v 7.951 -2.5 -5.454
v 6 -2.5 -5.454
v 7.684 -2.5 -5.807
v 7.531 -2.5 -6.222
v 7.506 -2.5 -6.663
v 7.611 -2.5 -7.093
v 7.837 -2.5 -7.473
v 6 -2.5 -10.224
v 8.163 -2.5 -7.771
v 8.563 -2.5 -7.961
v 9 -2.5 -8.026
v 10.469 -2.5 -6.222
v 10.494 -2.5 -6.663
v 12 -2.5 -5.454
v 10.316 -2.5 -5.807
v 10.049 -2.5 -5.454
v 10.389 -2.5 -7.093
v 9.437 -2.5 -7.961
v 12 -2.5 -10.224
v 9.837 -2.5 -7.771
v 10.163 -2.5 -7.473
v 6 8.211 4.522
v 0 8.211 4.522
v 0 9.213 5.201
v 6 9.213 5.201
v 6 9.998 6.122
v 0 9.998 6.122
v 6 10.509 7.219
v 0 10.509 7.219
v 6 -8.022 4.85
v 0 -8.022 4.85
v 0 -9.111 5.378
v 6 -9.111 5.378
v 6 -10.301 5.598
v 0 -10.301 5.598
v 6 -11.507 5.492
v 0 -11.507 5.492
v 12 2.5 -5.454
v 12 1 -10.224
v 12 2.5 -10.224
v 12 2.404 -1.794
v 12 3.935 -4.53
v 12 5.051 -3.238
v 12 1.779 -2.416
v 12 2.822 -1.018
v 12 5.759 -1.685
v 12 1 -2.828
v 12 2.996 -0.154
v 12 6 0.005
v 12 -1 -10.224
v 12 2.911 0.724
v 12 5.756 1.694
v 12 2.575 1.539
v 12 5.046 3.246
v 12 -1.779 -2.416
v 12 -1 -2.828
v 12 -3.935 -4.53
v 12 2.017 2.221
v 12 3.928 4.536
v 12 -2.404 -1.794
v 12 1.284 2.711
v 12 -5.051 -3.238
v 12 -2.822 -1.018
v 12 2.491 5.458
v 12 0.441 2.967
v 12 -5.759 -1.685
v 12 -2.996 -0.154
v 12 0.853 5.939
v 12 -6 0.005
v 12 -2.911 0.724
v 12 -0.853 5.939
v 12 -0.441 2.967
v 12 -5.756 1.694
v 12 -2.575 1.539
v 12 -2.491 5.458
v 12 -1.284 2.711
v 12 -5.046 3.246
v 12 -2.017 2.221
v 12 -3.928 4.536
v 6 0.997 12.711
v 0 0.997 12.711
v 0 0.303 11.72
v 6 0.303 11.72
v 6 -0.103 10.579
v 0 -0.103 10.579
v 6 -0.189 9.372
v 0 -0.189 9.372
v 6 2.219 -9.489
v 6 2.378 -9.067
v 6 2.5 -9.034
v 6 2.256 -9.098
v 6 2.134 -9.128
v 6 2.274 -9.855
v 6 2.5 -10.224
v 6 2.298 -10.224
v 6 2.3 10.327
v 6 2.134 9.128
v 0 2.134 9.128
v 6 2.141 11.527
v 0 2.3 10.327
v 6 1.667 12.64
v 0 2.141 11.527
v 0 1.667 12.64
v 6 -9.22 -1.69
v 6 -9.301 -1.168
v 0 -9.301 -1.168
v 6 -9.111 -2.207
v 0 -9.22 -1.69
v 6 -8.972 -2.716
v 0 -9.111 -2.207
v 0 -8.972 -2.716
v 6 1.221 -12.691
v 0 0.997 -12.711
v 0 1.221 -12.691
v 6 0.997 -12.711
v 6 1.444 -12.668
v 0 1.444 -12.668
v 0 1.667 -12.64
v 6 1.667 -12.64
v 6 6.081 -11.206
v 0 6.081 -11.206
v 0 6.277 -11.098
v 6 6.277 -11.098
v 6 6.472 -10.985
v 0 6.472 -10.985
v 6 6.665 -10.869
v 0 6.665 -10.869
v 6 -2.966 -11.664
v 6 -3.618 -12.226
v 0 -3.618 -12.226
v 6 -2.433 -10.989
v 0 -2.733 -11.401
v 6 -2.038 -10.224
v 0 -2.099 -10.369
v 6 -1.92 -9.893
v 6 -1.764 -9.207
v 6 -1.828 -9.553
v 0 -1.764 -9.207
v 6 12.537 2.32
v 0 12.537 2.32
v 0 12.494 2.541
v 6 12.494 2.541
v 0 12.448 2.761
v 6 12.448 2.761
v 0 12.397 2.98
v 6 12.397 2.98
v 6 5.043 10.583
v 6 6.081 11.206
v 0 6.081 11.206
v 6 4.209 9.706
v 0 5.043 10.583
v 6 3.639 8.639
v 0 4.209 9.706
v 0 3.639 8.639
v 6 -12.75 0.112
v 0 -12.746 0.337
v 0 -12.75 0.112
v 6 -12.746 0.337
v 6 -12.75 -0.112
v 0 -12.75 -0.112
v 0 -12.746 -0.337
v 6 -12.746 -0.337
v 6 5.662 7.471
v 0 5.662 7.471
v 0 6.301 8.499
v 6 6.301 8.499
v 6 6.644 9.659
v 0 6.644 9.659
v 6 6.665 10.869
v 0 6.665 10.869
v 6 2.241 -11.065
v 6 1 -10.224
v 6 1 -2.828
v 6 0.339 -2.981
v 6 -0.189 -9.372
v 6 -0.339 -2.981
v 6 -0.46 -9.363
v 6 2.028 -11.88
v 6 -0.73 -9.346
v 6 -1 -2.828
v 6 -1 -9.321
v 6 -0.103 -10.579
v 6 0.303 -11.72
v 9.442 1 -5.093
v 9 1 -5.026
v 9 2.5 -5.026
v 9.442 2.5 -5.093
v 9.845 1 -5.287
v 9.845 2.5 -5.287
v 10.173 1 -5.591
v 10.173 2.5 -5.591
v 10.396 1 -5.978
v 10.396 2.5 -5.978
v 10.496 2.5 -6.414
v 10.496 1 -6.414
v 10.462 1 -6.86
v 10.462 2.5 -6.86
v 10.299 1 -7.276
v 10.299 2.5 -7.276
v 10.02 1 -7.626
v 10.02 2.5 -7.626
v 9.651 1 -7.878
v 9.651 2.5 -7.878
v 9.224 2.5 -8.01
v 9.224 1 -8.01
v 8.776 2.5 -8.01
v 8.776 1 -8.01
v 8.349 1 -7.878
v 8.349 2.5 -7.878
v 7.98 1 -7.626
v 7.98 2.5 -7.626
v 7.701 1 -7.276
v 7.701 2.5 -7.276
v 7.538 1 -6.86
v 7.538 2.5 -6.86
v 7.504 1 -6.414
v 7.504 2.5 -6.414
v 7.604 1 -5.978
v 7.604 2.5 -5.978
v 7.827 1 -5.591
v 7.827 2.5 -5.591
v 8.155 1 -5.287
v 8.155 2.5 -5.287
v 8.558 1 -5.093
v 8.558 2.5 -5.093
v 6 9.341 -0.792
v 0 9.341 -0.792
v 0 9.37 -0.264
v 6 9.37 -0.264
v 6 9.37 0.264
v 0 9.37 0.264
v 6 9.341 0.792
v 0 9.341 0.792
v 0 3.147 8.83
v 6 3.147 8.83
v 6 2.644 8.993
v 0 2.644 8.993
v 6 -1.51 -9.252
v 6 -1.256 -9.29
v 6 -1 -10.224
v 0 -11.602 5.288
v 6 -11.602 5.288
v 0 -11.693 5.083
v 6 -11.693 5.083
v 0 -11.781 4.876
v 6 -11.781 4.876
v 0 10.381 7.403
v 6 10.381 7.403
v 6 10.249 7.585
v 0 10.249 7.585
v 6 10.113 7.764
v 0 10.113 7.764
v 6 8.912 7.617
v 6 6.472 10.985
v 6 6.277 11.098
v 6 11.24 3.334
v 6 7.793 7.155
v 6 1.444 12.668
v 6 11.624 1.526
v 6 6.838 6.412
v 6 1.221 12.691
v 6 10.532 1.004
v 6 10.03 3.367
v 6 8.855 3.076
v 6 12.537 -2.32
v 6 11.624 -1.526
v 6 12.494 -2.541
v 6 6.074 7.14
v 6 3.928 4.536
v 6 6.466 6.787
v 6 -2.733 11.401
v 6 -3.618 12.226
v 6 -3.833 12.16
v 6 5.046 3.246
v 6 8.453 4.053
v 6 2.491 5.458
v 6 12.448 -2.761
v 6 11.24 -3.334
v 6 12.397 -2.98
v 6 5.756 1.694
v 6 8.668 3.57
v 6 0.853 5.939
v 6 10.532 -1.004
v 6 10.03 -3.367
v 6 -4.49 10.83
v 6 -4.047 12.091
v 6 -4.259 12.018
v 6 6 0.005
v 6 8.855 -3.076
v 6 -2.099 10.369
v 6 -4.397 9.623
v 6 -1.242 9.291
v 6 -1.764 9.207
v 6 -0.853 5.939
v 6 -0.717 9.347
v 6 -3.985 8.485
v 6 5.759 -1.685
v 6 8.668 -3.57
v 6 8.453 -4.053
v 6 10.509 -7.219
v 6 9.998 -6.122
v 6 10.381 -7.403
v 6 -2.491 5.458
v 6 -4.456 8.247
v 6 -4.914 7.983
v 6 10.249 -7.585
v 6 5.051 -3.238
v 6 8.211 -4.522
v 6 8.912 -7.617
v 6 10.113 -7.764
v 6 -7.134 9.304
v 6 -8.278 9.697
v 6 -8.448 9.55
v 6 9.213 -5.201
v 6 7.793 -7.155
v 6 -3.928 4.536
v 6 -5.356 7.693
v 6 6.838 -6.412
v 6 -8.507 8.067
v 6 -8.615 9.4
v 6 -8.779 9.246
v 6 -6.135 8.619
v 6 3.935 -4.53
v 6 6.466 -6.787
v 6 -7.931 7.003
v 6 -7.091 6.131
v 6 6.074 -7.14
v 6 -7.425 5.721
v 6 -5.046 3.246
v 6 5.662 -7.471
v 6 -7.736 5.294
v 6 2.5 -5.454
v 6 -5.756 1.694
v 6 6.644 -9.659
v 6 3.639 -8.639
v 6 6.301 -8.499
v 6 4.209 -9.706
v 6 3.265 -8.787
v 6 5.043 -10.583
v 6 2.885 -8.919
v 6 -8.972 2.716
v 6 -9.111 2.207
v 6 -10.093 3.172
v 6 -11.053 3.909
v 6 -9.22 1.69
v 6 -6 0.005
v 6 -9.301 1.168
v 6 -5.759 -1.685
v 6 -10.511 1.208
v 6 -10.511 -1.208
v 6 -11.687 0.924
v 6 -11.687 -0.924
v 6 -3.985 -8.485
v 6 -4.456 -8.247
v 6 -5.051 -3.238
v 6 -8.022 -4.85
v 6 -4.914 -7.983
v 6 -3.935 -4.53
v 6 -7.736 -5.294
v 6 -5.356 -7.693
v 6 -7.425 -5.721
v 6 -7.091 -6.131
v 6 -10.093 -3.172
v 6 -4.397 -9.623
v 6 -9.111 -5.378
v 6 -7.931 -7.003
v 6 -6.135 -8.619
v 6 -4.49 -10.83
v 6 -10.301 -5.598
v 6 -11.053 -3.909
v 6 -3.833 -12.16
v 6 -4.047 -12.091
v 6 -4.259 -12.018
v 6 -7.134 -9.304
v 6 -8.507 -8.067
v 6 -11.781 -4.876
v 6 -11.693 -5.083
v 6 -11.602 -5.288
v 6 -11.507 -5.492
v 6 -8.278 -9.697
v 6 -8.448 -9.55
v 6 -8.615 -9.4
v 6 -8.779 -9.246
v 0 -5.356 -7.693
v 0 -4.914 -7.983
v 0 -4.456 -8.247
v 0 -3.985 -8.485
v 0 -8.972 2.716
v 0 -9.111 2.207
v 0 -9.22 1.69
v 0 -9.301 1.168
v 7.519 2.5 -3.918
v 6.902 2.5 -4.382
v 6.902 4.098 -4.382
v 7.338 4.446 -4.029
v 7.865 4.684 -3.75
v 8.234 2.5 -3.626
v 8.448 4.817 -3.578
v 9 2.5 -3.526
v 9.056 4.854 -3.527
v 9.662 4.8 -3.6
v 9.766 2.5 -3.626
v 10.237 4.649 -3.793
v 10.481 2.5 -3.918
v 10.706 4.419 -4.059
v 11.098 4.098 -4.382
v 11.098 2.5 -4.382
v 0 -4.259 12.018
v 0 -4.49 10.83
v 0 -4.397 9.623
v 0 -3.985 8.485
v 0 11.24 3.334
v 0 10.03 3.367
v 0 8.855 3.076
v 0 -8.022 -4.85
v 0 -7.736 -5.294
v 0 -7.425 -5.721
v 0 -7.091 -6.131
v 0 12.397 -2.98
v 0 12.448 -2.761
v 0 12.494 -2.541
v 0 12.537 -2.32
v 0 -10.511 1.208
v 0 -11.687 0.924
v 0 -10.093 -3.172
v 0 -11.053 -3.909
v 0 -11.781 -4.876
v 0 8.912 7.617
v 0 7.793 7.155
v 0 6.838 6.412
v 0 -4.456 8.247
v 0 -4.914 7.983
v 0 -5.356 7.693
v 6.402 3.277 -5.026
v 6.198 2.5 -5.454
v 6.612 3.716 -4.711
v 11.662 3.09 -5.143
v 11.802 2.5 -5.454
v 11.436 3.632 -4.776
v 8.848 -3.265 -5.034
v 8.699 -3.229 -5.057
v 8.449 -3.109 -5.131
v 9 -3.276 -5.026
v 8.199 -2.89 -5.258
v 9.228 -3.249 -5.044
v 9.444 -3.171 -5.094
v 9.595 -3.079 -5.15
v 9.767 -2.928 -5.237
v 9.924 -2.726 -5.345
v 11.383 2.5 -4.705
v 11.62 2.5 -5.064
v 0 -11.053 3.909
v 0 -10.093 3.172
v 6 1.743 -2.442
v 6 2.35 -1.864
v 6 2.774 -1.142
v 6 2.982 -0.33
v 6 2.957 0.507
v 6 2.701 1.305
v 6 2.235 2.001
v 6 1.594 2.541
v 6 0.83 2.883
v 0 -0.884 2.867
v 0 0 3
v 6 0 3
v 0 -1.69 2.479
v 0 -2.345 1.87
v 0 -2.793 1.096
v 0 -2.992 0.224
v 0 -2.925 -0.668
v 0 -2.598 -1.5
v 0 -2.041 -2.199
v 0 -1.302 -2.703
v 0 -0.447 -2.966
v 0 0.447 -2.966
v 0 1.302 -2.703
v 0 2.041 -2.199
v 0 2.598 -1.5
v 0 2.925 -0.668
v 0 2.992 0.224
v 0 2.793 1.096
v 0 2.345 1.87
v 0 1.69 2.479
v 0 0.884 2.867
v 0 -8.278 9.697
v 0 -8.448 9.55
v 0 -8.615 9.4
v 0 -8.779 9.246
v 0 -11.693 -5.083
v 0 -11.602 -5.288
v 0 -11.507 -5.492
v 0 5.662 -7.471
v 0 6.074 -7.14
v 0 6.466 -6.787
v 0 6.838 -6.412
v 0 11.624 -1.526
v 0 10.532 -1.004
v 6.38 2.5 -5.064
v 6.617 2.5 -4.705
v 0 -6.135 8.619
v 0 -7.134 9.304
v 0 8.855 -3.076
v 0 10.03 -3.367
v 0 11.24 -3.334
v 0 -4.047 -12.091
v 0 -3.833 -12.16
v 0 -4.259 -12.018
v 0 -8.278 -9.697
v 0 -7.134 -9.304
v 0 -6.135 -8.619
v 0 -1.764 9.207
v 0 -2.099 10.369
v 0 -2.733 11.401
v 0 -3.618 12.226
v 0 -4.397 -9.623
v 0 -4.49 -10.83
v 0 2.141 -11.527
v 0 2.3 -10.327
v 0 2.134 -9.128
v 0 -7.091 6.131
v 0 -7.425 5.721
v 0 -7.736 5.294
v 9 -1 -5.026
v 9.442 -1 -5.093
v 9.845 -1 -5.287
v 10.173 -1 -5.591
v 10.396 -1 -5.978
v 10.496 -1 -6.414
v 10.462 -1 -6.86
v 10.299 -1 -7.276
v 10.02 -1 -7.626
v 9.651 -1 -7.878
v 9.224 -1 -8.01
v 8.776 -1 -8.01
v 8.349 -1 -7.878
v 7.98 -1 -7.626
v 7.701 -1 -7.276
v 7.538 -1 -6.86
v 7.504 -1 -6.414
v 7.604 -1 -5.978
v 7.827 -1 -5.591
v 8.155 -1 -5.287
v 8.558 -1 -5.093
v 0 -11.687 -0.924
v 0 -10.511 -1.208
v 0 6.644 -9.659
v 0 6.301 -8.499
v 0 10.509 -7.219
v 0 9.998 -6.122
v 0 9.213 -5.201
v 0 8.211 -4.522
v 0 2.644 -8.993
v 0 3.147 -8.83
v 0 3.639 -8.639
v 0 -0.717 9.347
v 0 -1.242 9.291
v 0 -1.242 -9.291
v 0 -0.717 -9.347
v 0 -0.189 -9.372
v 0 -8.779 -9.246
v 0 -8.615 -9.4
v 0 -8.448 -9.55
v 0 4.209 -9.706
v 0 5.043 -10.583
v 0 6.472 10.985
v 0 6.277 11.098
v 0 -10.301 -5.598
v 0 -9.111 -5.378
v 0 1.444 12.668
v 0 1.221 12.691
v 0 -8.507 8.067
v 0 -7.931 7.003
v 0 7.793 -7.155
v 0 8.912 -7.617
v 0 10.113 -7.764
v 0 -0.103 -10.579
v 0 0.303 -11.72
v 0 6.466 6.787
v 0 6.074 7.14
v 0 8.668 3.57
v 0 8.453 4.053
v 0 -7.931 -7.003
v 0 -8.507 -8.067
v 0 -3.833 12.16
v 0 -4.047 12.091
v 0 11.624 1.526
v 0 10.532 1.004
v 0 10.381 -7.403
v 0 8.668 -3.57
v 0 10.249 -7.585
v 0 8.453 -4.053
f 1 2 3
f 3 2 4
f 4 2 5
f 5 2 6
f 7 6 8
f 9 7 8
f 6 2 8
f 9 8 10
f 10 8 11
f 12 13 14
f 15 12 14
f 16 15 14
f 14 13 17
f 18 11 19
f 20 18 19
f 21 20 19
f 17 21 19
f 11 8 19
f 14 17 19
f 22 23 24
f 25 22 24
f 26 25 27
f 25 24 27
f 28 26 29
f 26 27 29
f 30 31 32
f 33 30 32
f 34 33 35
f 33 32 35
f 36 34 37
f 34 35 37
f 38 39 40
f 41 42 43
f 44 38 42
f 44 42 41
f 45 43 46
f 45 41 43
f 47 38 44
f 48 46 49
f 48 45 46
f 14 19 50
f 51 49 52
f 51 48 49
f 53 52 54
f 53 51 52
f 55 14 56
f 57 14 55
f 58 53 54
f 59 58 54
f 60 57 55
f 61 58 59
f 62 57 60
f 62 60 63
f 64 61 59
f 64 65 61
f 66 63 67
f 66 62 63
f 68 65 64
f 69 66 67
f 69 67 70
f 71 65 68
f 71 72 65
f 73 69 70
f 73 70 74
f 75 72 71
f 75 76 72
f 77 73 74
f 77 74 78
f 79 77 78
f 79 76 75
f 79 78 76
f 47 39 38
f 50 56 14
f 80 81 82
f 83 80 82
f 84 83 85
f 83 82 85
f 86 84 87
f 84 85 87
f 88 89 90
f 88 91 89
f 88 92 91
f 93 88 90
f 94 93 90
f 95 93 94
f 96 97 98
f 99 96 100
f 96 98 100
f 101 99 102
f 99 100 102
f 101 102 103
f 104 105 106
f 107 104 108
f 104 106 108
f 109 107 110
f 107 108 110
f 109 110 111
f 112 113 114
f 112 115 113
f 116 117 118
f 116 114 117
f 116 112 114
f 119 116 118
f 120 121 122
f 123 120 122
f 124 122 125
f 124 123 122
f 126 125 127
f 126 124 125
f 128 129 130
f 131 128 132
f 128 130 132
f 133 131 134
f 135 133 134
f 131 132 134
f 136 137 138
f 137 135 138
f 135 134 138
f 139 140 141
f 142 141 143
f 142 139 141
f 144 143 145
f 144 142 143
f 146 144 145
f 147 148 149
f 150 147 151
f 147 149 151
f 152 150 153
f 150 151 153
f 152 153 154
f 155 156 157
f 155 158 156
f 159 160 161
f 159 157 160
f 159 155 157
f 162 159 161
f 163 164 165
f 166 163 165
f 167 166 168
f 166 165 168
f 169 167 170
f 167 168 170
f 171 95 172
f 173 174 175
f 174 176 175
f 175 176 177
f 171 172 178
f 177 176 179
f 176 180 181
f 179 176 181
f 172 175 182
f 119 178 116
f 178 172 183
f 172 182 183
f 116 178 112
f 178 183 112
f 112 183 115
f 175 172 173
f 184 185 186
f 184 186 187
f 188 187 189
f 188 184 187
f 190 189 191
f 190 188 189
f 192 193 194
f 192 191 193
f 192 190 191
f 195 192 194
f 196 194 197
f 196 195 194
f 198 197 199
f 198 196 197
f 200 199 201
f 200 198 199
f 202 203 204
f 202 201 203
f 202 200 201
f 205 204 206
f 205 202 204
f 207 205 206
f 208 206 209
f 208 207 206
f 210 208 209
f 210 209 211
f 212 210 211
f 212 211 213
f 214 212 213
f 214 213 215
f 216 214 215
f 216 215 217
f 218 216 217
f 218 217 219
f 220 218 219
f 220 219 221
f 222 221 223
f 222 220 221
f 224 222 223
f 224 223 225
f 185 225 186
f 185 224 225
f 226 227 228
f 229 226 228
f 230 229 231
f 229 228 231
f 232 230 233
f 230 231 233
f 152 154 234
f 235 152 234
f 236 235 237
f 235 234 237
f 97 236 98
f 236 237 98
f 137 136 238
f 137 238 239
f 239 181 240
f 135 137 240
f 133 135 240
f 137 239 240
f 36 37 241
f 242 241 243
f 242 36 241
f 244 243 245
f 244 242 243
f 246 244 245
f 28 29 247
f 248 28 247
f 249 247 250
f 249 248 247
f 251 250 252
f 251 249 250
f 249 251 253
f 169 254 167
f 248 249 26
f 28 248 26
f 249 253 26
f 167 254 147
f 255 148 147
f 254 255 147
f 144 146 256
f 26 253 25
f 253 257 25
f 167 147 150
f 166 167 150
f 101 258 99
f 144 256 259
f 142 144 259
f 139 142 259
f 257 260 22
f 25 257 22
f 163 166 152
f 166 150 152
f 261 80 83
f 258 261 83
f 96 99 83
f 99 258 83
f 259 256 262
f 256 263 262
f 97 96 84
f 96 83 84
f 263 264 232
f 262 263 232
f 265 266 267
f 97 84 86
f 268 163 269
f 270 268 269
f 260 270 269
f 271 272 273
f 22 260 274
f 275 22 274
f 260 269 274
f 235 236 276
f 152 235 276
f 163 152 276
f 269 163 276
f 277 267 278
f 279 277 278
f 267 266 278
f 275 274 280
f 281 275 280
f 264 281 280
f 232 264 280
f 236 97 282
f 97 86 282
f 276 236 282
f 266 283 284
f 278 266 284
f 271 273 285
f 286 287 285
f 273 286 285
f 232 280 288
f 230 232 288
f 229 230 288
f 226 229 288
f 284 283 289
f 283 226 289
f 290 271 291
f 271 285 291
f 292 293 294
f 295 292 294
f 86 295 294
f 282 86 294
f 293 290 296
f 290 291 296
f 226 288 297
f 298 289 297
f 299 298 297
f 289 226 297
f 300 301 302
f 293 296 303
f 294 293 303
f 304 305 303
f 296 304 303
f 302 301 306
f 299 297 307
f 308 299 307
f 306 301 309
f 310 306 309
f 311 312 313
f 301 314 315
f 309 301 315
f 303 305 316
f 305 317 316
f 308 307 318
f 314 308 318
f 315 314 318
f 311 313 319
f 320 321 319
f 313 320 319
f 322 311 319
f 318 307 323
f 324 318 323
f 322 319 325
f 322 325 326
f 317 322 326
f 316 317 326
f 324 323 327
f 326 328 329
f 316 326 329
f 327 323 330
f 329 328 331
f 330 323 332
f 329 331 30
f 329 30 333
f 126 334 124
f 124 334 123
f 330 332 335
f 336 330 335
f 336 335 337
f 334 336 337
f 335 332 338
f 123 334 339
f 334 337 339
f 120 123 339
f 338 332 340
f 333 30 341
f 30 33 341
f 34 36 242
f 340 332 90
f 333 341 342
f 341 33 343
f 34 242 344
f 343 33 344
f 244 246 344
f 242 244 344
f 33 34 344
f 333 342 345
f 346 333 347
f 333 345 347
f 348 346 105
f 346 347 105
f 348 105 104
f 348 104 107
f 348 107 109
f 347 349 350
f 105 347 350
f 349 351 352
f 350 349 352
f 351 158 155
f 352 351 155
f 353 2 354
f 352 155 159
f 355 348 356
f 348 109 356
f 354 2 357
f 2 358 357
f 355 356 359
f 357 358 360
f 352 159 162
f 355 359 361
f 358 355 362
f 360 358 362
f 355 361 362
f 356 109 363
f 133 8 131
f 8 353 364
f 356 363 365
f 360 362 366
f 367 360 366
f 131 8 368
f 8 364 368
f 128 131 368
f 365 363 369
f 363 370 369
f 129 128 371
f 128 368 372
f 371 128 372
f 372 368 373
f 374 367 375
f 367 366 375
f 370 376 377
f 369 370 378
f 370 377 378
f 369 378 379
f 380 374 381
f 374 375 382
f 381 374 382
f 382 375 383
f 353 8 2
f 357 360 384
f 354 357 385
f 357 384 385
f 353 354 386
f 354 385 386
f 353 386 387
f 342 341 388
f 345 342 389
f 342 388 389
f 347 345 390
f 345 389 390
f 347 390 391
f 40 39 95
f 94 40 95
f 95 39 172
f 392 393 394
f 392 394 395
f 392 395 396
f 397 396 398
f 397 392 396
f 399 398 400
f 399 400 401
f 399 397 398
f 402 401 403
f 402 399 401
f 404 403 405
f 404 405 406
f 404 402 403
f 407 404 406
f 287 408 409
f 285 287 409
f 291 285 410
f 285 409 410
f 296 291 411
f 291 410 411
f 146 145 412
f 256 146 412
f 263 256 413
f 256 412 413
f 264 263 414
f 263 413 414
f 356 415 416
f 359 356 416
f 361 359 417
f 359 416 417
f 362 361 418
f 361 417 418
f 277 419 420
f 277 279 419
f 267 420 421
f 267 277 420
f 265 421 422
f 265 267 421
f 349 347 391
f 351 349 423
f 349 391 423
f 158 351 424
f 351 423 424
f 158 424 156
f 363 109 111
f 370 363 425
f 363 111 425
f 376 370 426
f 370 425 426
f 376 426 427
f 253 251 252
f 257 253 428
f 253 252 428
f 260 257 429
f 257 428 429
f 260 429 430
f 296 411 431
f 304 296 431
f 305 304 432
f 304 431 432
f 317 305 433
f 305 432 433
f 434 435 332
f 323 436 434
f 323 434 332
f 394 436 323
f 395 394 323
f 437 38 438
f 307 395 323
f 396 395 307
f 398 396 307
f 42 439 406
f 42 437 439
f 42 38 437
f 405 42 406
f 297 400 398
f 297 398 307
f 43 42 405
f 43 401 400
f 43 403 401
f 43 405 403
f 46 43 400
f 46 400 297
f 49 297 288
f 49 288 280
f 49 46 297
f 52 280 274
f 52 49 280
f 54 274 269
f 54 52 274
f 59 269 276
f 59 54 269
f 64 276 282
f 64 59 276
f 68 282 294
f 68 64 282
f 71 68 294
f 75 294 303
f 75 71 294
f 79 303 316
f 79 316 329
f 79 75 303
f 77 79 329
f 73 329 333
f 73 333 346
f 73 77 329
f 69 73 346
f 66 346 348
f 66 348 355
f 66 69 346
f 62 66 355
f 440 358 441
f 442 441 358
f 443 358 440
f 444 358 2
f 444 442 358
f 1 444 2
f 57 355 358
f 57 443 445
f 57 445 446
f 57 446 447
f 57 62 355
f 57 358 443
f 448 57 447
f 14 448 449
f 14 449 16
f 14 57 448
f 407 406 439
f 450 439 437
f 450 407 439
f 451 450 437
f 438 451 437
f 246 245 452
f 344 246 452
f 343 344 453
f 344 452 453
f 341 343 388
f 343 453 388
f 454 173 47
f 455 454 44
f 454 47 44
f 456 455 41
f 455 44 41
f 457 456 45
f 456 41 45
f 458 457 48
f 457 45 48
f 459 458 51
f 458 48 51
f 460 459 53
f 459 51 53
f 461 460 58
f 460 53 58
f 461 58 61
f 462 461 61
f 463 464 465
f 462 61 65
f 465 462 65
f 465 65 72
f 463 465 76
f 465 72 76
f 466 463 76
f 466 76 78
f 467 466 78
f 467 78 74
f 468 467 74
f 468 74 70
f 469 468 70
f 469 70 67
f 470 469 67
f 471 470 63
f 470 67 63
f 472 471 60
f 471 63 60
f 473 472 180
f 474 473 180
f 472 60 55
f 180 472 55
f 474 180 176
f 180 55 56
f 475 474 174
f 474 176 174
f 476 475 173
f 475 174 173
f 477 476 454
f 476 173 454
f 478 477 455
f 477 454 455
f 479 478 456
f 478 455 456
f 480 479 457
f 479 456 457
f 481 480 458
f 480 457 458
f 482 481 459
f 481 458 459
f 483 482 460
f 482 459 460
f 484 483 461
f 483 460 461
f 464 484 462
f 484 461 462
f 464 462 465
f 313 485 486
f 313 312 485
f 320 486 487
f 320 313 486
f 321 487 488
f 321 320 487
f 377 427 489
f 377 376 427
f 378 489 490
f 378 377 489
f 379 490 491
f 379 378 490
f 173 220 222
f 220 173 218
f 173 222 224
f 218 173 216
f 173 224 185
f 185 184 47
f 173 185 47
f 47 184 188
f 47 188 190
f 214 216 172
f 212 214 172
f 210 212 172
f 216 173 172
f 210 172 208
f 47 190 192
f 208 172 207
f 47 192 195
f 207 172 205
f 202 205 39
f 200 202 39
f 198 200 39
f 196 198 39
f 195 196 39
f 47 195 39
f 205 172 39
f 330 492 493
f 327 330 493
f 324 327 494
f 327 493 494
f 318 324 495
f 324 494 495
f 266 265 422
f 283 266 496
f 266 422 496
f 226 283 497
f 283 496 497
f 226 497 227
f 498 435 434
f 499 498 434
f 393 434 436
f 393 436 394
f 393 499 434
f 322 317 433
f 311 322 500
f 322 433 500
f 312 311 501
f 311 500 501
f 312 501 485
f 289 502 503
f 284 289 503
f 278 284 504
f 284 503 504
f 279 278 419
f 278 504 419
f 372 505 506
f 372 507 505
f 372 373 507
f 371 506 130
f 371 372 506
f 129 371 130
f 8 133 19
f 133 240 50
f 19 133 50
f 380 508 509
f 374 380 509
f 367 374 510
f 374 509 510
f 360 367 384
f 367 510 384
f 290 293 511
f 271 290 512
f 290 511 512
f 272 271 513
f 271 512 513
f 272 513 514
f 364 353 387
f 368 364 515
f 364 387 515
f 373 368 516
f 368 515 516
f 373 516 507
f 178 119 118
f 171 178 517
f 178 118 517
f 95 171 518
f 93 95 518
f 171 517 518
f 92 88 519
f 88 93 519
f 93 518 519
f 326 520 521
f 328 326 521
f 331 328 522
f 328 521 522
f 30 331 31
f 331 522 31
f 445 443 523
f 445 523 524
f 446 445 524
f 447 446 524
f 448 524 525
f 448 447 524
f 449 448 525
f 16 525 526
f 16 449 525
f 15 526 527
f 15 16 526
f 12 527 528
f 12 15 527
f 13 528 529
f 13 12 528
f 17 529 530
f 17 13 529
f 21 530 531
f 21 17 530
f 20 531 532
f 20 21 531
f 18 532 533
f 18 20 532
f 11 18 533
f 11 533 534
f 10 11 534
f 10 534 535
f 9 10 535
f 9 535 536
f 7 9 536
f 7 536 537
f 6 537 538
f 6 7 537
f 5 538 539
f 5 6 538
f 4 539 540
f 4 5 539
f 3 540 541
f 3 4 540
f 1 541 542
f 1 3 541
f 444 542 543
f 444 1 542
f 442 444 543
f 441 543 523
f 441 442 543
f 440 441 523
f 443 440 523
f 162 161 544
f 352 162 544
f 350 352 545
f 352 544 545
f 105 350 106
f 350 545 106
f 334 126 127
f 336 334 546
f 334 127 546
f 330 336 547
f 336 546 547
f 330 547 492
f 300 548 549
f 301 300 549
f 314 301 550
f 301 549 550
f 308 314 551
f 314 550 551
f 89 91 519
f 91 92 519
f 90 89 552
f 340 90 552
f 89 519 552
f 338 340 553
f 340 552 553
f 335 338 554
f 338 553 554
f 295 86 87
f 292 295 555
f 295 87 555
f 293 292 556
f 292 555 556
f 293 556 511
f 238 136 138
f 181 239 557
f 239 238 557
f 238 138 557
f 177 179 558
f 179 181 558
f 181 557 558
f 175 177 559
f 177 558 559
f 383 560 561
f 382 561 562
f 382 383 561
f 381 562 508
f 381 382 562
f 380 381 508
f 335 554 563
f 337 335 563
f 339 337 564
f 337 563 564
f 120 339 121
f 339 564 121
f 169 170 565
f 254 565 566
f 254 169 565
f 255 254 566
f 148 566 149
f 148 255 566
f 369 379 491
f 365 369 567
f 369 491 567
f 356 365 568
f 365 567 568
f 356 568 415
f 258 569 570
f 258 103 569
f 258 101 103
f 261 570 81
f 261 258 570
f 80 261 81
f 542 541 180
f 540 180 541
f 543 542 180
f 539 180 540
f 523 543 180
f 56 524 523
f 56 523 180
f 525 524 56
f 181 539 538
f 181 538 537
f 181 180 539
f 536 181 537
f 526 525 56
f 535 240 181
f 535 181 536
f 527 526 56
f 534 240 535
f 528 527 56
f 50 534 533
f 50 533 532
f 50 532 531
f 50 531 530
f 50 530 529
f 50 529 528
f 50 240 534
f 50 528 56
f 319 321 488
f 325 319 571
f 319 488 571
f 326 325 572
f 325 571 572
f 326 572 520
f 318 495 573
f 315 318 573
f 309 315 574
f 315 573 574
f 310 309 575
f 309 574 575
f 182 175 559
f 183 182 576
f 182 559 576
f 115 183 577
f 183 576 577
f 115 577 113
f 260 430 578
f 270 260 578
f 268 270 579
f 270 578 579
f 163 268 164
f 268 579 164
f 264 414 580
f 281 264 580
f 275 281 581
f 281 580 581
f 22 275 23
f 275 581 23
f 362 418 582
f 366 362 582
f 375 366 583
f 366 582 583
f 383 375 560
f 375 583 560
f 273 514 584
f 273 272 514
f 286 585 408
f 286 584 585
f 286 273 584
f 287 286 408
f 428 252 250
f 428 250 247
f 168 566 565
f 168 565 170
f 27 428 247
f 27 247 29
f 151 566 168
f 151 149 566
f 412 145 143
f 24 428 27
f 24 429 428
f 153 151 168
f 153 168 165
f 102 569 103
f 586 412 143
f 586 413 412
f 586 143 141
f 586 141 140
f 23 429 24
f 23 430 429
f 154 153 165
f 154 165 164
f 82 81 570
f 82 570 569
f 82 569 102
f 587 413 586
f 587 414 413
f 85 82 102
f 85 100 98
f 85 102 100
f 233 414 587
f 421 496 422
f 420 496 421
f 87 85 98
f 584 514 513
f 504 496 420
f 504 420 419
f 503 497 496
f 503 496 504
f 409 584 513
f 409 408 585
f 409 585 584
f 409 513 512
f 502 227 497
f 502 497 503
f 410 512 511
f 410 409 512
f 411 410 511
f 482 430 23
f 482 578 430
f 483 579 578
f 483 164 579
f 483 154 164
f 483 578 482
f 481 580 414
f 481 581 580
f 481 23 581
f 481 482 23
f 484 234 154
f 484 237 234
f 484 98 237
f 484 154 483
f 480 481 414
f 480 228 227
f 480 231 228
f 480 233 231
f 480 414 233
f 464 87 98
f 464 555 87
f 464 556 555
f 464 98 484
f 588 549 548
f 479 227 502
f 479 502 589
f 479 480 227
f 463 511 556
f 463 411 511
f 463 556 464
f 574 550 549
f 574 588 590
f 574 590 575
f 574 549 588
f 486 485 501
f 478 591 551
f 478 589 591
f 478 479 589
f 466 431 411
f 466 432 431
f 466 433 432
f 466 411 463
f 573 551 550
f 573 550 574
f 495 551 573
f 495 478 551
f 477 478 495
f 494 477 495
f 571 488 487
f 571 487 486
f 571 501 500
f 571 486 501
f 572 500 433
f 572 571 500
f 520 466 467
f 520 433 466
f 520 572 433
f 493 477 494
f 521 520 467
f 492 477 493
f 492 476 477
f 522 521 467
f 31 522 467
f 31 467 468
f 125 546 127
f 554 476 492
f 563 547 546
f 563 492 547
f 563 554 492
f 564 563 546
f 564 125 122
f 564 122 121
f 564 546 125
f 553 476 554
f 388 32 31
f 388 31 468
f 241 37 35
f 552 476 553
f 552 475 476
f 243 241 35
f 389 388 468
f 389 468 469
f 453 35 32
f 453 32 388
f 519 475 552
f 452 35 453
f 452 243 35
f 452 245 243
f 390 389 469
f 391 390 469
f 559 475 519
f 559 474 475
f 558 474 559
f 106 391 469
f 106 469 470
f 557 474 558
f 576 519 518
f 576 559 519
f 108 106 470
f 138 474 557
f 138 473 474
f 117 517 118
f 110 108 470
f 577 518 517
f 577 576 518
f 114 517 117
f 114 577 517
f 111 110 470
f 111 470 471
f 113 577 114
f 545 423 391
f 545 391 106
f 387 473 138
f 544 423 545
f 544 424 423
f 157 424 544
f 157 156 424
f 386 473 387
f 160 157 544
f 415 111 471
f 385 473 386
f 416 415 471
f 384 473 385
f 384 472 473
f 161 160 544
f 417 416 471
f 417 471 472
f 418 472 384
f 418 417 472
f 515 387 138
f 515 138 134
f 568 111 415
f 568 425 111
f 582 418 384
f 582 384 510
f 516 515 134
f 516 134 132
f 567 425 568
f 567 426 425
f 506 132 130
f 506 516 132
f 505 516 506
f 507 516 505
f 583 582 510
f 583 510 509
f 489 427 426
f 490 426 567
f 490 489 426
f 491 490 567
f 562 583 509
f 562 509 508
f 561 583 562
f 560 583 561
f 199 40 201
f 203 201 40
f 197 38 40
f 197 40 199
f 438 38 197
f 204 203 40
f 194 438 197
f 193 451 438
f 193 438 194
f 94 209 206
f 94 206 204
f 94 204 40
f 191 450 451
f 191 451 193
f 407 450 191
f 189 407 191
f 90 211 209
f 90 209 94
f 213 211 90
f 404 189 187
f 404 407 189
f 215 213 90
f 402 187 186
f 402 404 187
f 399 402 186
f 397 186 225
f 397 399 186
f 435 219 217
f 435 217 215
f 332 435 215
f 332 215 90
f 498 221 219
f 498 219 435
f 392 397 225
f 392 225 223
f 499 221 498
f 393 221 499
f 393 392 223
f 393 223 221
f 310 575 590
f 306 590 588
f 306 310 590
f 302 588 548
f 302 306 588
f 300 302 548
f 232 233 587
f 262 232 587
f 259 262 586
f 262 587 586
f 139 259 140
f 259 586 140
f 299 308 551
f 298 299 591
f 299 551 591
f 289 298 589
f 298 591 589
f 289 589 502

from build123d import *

# Parameters (mm, degrees)
BASPROSKE_W             = 6
BASPROSKE_H             = 12.75
TOOTHCUT_DEPTH          = 20.003289189
TEETHCUTS_COUNT         = 15
TEETHCUTS_ANGLE         = 336
BORSKE_R                = 3
BORE_DEPTH              = 50.0000508
BOSS_EXTRUDE2_START     = 6
SKETCH1_R               = 6
SKETCH1_R_2             = 3
BOSS_EXTRUDE2_DEPTH     = 6
CUT_EXTRUDE1_START      = -6.0000001
CUT_EXTRUDE1_OUTLINE_W  = 6
CUT_EXTRUDE1_OUTLINE_H  = 2
CUT_EXTRUDE1_DEPTH      = 3.171572975
SKETCH3_W               = 6
SKETCH3_H               = 7.395975174
BOSS_EXTRUDE3_DEPTH     = 1.5
BOSS_EXTRUDE4_DEPTH     = 1.5
CUT_EXTRUDE2_DEPTH      = 23.109303185
CUT_EXTRUDE2_DEPTH_BACK = 23.109303185
SKETCH6_R               = 1.5
CUT_EXTRUDE3_DEPTH      = 24.197646745


# Read off the part's stored shape, not the designer's step: Cut-Extrude1
with BuildPart() as part:
    # BasProSke → Base-Revolve (revolve)
    with BuildSketch(Plane(origin=(0, 0, 0), x_dir=(1, 0, 0), z_dir=(0, 1, 0)), mode=Mode.PRIVATE) as base_revolve_sk:
        with Locations((3, 6.375)):
            Rectangle(BASPROSKE_W, BASPROSKE_H)
    revolve(base_revolve_sk.sketch.rotate(Axis((-10, 0, 0), (1, 0, 0)), 180), axis=Axis((-10, 0, 0), (1, 0, 0)))

    # TooCutSke → ToothCut (cut, through all)
    with BuildSketch(Plane(origin=(0, 0, 0), x_dir=(0, 0, -1), z_dir=(1, 0, 0))):
        with BuildLine():
            ThreePointArc((0.791546546, 9.340520867), (0, 9.374), (-0.791546546, 9.340520867))
            ThreePointArc((-0.791546546, 9.340520867), (-1.235070734, 11.110218102), (-2.344732916, 12.558386549))
            ThreePointArc((-2.344732916, 12.558386549), (0, 12.7754), (2.344732916, 12.558386549))
            ThreePointArc((2.344732916, 12.558386549), (1.235070734, 11.110218102), (0.791546546, 9.340520867))
        make_face()
    toothcut = extrude(amount=TOOTHCUT_DEPTH, mode=Mode.SUBTRACT)

    # TeethCuts: ToothCut ×15 about axis
    teethcuts_axis = Axis((-10, 0, 0), (1, 0, 0))
    for i in range(1, TEETHCUTS_COUNT):
        add(toothcut.rotate(teethcuts_axis, i * TEETHCUTS_ANGLE / (TEETHCUTS_COUNT - 1)), mode=Mode.SUBTRACT)

    # BorSke → Bore (cut, symmetric)
    with BuildSketch(Plane(origin=(0, 0, 0), x_dir=(0, 0, -1), z_dir=(1, 0, 0))):
        with Locations(Location((0, 0, 0), (0, 0, 180))):
            Circle(BORSKE_R)
    extrude(amount=BORE_DEPTH, both=True, mode=Mode.SUBTRACT)

    # Sketch1 → Boss-Extrude2 (add)
    with BuildSketch(Plane(origin=(6, 0, 0), x_dir=(0, 0, -1), z_dir=(1, 0, 0)).offset(BOSS_EXTRUDE2_START)):
        with Locations(Location((0, 0, 0), (0, 0, 180))):
            Circle(SKETCH1_R)
        Circle(SKETCH1_R_2, mode=Mode.SUBTRACT)
    extrude(amount=-BOSS_EXTRUDE2_DEPTH)

    # Cut-Extrude1 outline → Cut-Extrude1 (cut)
    with BuildSketch(Plane.XY.offset(CUT_EXTRUDE1_START)):
        with Locations((9, 0)):
            Rectangle(CUT_EXTRUDE1_OUTLINE_W, CUT_EXTRUDE1_OUTLINE_H)
    extrude(amount=CUT_EXTRUDE1_DEPTH, mode=Mode.SUBTRACT)

    # Sketch3 → Boss-Extrude3 (add)
    with BuildSketch(Plane(origin=(0, -1, 0), x_dir=(1, 0, 0), z_dir=(0, 1, 0))):
        with Locations((9, 6.526414712)):
            Rectangle(SKETCH3_W, SKETCH3_H)
    extrude(amount=-BOSS_EXTRUDE3_DEPTH)

    # Sketch5 → Boss-Extrude4 (add)
    with BuildSketch(Plane.XZ.offset(-1)):
        Polygon((6, -10.224402299), (6, -9.320508355), (6, -2.828427125), (12, -2.828427125), (12, -10.224402299), align=None)
    extrude(amount=-BOSS_EXTRUDE4_DEPTH)

    # Sketch6 → Cut-Extrude2 (cut, two sides: drawn at the far end of the back side and taken through both)
    with BuildSketch(Plane(origin=(0, -1, 0), x_dir=(1, 0, 0), z_dir=(0, 1, 0)).offset(-CUT_EXTRUDE2_DEPTH_BACK)):
        with Locations(Location((9, 6.526414712, 0), (0, 0, 270))):
            Circle(SKETCH6_R)
    extrude(amount=CUT_EXTRUDE2_DEPTH + CUT_EXTRUDE2_DEPTH_BACK, mode=Mode.SUBTRACT)

    # Sketch7 → Cut-Extrude3 (cut, through all)
    with BuildSketch(Plane(origin=(0, 2.5, 0), x_dir=(1, 0, 0), z_dir=(0, 1, 0))):
        with BuildLine():
            ThreePointArc((6.901724288, 4.382297403), (9, 3.526414712), (11.098275712, 4.382297403))
            ThreePointArc((11.098275712, 4.382297403), (9, 9.526414712), (6.901724288, 4.382297403))
        make_face()
    extrude(amount=CUT_EXTRUDE3_DEPTH, mode=Mode.SUBTRACT)


solid = part.part
